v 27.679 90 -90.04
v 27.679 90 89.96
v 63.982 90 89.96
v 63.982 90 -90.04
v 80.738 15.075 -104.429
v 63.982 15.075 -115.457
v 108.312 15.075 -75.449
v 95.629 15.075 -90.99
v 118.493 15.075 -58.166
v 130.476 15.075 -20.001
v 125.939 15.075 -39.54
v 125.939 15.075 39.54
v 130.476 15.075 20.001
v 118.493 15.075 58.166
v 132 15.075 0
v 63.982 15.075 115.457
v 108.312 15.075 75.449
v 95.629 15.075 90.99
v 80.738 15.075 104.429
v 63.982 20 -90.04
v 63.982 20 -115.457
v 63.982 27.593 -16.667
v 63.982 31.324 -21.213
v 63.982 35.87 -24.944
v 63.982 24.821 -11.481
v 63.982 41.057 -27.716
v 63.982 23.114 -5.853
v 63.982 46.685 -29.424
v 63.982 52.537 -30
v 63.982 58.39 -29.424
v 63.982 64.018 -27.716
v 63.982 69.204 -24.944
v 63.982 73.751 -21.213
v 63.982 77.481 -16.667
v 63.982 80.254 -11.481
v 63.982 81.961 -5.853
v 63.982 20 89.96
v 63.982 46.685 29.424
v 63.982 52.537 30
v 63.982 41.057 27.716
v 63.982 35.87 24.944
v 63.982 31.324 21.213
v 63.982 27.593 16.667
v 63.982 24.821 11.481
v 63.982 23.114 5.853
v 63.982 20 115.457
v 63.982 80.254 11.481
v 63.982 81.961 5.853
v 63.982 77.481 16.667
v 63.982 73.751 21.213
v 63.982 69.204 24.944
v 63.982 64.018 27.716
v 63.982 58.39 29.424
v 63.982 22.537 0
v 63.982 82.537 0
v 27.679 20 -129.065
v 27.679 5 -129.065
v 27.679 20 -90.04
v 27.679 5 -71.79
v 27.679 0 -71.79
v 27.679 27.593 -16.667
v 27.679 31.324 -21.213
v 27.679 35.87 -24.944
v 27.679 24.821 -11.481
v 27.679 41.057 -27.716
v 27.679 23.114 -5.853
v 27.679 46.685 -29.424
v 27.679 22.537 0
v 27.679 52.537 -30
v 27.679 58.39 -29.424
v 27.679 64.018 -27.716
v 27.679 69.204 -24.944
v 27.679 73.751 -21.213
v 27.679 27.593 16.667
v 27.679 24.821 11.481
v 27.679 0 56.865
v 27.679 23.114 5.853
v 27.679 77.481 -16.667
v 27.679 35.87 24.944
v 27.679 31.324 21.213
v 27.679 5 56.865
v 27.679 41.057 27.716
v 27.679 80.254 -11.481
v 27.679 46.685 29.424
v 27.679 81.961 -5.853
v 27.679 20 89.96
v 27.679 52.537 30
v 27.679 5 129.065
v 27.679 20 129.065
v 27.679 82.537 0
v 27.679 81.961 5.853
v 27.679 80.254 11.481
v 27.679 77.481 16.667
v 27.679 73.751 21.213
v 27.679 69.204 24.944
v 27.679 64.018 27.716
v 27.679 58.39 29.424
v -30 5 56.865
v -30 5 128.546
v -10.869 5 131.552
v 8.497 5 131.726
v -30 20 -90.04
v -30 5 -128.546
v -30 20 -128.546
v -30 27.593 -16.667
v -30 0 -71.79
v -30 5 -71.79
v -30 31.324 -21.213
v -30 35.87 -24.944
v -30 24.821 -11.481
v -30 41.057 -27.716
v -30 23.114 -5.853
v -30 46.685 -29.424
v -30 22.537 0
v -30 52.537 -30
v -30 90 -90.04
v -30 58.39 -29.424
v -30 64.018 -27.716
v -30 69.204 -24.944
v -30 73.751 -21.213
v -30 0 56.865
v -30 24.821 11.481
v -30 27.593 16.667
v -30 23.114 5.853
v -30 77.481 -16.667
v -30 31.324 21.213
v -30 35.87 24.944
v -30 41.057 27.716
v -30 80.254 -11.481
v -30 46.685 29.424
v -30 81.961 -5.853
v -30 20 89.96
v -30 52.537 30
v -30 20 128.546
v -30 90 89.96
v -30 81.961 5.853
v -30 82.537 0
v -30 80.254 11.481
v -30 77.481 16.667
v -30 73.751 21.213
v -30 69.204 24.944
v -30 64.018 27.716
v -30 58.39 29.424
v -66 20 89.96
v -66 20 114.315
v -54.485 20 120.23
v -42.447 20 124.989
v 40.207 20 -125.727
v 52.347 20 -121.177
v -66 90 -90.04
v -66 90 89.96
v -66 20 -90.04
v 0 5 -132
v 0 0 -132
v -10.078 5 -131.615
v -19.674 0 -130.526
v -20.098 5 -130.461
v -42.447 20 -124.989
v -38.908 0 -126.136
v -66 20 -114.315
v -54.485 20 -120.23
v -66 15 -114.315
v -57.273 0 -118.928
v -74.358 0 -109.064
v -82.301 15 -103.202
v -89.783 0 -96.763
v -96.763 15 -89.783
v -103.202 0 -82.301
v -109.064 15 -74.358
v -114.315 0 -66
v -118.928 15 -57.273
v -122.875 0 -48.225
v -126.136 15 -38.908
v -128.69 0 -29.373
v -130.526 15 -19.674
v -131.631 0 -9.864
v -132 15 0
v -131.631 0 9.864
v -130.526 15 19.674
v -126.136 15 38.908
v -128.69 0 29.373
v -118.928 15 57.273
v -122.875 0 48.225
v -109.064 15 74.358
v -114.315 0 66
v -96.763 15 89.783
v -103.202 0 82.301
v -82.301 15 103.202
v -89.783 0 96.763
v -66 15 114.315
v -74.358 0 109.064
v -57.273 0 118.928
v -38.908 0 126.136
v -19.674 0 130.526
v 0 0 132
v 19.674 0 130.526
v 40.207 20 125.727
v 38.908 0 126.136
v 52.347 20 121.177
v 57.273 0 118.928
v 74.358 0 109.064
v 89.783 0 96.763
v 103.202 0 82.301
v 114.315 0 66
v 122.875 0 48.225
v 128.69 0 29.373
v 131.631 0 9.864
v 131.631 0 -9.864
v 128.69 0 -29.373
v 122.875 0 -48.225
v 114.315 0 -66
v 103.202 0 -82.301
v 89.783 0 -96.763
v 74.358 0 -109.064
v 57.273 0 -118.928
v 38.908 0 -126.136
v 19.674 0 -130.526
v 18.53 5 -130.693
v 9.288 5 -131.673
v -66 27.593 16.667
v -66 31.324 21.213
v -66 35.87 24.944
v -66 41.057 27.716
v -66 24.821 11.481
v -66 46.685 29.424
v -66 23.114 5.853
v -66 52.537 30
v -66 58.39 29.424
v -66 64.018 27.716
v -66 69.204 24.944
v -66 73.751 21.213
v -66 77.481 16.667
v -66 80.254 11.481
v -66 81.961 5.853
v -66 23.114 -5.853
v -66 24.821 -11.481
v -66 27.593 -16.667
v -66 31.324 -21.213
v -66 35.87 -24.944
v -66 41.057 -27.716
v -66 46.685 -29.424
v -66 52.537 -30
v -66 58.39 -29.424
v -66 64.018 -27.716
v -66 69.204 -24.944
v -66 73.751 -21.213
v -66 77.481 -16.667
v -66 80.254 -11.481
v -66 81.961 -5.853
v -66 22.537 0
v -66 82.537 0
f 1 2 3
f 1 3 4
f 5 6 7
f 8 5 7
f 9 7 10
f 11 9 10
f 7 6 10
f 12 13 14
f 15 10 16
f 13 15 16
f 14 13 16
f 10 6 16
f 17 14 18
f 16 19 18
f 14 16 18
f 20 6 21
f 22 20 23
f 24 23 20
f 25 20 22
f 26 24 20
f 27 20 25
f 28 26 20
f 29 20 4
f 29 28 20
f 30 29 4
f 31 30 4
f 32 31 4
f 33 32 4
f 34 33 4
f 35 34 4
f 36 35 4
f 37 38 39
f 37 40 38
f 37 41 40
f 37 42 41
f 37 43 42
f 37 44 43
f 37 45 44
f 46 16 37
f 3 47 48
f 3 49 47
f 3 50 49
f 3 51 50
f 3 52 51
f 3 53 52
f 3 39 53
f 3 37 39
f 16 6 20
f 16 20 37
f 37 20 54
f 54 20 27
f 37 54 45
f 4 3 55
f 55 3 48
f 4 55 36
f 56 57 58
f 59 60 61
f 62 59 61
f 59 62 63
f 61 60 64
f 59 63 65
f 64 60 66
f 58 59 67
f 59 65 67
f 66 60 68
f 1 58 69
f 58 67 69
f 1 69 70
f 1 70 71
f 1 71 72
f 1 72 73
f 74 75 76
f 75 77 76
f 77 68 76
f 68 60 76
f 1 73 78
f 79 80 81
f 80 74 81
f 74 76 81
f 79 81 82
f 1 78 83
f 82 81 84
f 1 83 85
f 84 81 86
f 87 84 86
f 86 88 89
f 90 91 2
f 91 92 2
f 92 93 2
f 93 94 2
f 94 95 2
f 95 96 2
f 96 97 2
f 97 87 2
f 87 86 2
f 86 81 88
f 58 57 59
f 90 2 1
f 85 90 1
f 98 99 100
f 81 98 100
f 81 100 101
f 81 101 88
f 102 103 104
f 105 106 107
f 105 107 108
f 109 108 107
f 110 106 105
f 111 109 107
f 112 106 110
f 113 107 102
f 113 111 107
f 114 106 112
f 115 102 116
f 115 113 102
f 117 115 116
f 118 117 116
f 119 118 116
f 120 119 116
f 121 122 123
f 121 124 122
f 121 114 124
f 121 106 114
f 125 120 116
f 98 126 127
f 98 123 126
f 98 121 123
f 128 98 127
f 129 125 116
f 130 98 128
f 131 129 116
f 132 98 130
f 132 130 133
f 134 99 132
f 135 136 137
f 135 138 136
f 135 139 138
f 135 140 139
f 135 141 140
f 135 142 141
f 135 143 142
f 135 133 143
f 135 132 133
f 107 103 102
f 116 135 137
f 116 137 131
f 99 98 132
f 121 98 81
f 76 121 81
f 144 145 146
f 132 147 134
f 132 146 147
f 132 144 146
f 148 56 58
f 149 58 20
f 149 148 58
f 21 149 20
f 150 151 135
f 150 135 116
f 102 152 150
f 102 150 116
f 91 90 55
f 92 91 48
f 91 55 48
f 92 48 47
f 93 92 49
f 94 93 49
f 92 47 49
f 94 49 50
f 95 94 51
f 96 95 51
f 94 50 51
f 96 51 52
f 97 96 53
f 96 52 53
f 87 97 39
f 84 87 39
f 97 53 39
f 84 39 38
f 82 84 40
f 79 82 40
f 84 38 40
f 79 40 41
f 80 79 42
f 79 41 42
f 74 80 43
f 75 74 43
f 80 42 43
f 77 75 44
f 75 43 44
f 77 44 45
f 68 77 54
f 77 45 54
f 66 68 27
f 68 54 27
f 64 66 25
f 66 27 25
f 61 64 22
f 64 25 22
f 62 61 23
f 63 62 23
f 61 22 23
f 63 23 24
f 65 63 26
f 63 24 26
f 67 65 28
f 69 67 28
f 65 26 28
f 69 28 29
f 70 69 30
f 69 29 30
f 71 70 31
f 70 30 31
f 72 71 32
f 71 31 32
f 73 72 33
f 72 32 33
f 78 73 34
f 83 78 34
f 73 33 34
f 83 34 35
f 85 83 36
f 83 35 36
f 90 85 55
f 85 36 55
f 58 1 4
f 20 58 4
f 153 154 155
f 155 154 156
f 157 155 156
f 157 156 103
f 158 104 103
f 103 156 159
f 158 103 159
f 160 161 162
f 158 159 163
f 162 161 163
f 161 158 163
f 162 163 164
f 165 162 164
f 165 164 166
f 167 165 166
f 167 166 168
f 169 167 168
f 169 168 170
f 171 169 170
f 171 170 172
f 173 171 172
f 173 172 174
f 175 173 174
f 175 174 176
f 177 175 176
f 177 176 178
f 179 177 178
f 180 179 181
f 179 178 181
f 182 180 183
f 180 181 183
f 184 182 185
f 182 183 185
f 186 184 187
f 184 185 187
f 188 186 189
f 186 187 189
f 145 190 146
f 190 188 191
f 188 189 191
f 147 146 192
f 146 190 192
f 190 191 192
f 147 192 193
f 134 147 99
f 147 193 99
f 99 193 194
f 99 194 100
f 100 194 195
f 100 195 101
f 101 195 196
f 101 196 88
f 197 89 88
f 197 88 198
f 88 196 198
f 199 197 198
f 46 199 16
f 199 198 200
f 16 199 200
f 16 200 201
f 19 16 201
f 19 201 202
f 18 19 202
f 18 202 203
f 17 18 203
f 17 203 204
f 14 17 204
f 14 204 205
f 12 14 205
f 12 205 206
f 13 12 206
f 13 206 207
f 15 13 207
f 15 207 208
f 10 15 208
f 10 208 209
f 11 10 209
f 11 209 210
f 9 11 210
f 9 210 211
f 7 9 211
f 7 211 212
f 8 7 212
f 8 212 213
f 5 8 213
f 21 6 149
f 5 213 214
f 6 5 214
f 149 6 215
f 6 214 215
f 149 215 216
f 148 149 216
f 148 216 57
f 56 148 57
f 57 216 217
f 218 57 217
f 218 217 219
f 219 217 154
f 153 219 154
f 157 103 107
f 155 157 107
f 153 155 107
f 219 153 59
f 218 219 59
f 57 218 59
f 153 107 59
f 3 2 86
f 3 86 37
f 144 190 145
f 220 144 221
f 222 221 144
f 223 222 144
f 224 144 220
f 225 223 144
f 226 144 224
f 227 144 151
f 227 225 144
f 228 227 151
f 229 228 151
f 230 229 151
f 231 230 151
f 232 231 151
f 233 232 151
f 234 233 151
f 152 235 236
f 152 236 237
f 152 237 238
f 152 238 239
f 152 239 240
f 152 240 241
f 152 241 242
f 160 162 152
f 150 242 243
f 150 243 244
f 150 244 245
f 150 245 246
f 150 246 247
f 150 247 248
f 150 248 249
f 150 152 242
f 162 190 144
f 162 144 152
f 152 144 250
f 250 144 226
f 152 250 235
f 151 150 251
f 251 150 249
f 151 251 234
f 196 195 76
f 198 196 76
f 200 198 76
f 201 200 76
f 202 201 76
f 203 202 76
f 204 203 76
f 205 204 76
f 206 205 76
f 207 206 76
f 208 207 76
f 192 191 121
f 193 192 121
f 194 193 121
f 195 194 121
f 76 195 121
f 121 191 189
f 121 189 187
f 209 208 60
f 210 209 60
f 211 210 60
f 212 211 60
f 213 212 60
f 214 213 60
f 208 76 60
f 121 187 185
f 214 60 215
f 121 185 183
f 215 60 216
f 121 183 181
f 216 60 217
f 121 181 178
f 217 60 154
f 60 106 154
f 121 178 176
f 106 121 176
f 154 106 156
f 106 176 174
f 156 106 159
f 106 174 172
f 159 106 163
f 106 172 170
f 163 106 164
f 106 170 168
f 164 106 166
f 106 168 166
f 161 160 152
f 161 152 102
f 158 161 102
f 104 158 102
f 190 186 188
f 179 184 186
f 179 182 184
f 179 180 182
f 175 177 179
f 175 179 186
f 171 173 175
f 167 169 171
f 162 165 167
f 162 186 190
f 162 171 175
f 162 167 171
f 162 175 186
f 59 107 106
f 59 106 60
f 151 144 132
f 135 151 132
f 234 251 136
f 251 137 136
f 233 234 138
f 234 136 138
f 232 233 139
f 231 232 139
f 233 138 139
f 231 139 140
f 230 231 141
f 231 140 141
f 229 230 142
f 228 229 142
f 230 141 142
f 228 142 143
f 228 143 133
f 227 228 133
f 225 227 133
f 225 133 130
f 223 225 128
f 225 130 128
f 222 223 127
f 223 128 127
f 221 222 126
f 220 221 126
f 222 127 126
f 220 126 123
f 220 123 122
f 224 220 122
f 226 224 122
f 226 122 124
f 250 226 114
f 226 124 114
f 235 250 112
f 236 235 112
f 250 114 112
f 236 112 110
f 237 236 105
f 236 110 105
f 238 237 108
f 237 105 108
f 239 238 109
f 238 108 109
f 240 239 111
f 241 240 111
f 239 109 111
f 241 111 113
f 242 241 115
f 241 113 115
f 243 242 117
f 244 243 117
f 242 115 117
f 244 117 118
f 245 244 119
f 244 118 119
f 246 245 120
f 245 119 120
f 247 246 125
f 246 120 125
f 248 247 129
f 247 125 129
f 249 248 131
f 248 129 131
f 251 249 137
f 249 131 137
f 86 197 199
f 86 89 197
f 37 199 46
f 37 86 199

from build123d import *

# Parameters (mm, degrees)
SKETCH2_R           = 132
BOSS_EXTRUDE1_DEPTH = 90
SKETCH3_W           = 57.679416137
SKETCH3_H           = 85
CUT_EXTRUDE1_DEPTH  = 160
SKETCH4_W           = 66
SKETCH4_H           = 75
SKETCH4_W_2         = 69.873766725
SKETCH4_H_2         = 74.92536342
CUT_EXTRUDE2_DEPTH  = 160
SKETCH5_R           = 30
CUT_EXTRUDE3_DEPTH  = 160
SKETCH6_W           = 57.679416137
SKETCH6_H           = 128.655011674
CUT_EXTRUDE4_DEPTH  = 160
SKETCH7_W           = 202.247474543
SKETCH7_H           = 277.255171559
SKETCH7_W_2         = 143.334546523
SKETCH7_H_2         = 180
CUT_EXTRUDE5_DEPTH  = 70


with BuildPart() as part:
    # Sketch2 → Boss-Extrude1 (new body)
    with BuildSketch(Plane(origin=(0, 0, 0), x_dir=(1, 0, 0), z_dir=(0, 1, 0))):
        with Locations(Location((0, 0, 0), (0, 0, 90))):
            Circle(SKETCH2_R)
    extrude(amount=BOSS_EXTRUDE1_DEPTH)

    # Sketch3 → Cut-Extrude1 (cut, symmetric)
    with BuildSketch(Plane.XY):
        with Locations((-1.160291932, 47.5)):
            Rectangle(SKETCH3_W, SKETCH3_H)
    extrude(amount=CUT_EXTRUDE1_DEPTH, both=True, mode=Mode.SUBTRACT)

    # Sketch4 → Cut-Extrude2 (cut, symmetric)
    with BuildSketch(Plane.XY):
        with Locations((-99, 52.5)):
            Rectangle(SKETCH4_W, SKETCH4_H)
        with Locations((98.918931808, 52.53731829)):
            Rectangle(SKETCH4_W_2, SKETCH4_H_2)
    extrude(amount=CUT_EXTRUDE2_DEPTH, both=True, mode=Mode.SUBTRACT)

    # Sketch5 → Cut-Extrude3 (cut, symmetric)
    with BuildSketch(Plane(origin=(63.982048445, 0, 0), x_dir=(0, 0, -1), z_dir=(1, 0, 0))):
        with Locations(Location((0, 52.53731829, 0), (0, 0, 90))):
            Circle(SKETCH5_R)
    extrude(amount=CUT_EXTRUDE3_DEPTH, both=True, mode=Mode.SUBTRACT)

    # Sketch6 → Cut-Extrude4 (cut, symmetric)
    with BuildSketch(Plane(origin=(0, 5, 0), x_dir=(1, 0, 0), z_dir=(0, 1, 0))):
        with Locations((-1.160291932, 7.462587684)):
            Rectangle(SKETCH6_W, SKETCH6_H)
    extrude(amount=CUT_EXTRUDE4_DEPTH, both=True, mode=Mode.SUBTRACT)

    # Sketch7 → Cut-Extrude5 (cut, symmetric)
    with BuildSketch(Plane(origin=(0, 90, 0), x_dir=(1, 0, 0), z_dir=(0, 1, 0))):
        with Locations((-4.464336864, -2.73307398)):
            Rectangle(SKETCH7_W, SKETCH7_H)
        with Locations((-1.427587997, 0.039603907)):
            Rectangle(SKETCH7_W_2, SKETCH7_H_2, mode=Mode.SUBTRACT)
    extrude(amount=CUT_EXTRUDE5_DEPTH, both=True, mode=Mode.SUBTRACT)


solid = part.part
